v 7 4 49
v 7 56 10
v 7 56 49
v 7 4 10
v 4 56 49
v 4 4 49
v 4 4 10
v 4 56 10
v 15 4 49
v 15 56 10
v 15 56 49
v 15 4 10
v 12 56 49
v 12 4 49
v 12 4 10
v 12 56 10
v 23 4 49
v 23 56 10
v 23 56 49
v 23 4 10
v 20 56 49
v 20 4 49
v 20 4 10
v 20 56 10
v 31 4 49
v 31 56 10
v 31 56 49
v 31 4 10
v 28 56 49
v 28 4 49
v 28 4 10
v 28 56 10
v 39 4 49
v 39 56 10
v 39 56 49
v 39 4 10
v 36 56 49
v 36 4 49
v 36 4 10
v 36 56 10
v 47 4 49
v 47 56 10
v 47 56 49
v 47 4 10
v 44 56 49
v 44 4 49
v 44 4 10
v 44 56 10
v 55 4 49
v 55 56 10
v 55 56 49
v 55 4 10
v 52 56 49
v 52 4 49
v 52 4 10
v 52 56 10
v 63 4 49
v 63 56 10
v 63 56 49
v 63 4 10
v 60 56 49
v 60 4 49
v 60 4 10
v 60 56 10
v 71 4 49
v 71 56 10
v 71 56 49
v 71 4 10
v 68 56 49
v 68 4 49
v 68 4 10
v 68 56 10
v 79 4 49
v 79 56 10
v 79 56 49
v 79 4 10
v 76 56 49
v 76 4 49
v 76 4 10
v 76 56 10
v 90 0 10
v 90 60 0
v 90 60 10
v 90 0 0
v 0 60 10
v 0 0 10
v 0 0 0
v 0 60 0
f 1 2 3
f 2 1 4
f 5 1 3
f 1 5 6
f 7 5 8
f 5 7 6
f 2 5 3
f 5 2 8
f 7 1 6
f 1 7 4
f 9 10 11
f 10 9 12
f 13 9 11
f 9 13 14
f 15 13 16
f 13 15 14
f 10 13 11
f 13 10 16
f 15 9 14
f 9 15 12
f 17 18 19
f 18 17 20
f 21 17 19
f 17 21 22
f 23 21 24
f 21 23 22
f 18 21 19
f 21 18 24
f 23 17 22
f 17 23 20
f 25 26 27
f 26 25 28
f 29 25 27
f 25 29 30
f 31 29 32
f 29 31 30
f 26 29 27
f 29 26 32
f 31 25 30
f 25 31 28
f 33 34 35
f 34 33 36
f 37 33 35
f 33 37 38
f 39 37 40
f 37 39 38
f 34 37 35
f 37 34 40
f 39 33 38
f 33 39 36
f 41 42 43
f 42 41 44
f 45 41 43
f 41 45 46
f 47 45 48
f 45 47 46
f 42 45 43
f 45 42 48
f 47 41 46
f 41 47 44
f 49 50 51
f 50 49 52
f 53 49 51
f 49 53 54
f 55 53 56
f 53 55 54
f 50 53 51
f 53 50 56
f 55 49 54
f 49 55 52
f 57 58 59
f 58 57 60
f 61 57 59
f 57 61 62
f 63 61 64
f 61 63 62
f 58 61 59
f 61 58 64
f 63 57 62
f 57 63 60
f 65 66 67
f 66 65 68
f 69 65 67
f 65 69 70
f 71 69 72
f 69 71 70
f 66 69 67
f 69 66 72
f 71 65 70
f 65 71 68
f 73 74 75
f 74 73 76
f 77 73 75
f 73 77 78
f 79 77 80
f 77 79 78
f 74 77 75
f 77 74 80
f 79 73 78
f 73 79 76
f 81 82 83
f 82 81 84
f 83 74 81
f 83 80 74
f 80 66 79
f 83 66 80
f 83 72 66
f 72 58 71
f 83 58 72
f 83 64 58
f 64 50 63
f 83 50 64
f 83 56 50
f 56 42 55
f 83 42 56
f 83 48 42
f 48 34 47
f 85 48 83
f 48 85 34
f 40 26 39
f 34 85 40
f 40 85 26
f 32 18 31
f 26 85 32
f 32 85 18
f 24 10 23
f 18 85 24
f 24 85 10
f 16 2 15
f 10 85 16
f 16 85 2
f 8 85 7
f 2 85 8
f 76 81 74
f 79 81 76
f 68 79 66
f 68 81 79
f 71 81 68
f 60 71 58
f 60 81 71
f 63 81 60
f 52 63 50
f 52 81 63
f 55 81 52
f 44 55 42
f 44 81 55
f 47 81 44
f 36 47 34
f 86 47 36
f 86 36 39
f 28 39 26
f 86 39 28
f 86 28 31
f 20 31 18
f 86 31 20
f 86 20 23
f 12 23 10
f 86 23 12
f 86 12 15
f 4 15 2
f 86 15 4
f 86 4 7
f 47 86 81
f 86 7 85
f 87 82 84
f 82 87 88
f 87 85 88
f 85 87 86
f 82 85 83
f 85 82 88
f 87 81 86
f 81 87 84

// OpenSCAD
$fn = 32;

// ----------------------------------------------------------------------
// Heatsink: uniform fin block
// ----------------------------------------------------------------------

// --- parameters (mm) ---
base_l = 90;              // base length, X
base_w = 60;              // base width, Y
base_t = 10;              // base plate thickness
fin_h = 40;               // fin height above the base
fin_t = 3;                // fin thickness
edge = 4;                 // margin from the base ends
pitch = 8;                // fin pitch

n_fins = floor((base_l - 2 * edge - fin_t) / pitch) + 1;  // fin count
total_h = base_t + fin_h - 1;  // overall height

union() {
  cube([base_l, base_w, base_t]);
  for (i = [0 : n_fins - 1])
    translate([edge + i * pitch, edge, base_t - 1])
      cube([fin_t, base_w - 2 * edge, fin_h]);
}
